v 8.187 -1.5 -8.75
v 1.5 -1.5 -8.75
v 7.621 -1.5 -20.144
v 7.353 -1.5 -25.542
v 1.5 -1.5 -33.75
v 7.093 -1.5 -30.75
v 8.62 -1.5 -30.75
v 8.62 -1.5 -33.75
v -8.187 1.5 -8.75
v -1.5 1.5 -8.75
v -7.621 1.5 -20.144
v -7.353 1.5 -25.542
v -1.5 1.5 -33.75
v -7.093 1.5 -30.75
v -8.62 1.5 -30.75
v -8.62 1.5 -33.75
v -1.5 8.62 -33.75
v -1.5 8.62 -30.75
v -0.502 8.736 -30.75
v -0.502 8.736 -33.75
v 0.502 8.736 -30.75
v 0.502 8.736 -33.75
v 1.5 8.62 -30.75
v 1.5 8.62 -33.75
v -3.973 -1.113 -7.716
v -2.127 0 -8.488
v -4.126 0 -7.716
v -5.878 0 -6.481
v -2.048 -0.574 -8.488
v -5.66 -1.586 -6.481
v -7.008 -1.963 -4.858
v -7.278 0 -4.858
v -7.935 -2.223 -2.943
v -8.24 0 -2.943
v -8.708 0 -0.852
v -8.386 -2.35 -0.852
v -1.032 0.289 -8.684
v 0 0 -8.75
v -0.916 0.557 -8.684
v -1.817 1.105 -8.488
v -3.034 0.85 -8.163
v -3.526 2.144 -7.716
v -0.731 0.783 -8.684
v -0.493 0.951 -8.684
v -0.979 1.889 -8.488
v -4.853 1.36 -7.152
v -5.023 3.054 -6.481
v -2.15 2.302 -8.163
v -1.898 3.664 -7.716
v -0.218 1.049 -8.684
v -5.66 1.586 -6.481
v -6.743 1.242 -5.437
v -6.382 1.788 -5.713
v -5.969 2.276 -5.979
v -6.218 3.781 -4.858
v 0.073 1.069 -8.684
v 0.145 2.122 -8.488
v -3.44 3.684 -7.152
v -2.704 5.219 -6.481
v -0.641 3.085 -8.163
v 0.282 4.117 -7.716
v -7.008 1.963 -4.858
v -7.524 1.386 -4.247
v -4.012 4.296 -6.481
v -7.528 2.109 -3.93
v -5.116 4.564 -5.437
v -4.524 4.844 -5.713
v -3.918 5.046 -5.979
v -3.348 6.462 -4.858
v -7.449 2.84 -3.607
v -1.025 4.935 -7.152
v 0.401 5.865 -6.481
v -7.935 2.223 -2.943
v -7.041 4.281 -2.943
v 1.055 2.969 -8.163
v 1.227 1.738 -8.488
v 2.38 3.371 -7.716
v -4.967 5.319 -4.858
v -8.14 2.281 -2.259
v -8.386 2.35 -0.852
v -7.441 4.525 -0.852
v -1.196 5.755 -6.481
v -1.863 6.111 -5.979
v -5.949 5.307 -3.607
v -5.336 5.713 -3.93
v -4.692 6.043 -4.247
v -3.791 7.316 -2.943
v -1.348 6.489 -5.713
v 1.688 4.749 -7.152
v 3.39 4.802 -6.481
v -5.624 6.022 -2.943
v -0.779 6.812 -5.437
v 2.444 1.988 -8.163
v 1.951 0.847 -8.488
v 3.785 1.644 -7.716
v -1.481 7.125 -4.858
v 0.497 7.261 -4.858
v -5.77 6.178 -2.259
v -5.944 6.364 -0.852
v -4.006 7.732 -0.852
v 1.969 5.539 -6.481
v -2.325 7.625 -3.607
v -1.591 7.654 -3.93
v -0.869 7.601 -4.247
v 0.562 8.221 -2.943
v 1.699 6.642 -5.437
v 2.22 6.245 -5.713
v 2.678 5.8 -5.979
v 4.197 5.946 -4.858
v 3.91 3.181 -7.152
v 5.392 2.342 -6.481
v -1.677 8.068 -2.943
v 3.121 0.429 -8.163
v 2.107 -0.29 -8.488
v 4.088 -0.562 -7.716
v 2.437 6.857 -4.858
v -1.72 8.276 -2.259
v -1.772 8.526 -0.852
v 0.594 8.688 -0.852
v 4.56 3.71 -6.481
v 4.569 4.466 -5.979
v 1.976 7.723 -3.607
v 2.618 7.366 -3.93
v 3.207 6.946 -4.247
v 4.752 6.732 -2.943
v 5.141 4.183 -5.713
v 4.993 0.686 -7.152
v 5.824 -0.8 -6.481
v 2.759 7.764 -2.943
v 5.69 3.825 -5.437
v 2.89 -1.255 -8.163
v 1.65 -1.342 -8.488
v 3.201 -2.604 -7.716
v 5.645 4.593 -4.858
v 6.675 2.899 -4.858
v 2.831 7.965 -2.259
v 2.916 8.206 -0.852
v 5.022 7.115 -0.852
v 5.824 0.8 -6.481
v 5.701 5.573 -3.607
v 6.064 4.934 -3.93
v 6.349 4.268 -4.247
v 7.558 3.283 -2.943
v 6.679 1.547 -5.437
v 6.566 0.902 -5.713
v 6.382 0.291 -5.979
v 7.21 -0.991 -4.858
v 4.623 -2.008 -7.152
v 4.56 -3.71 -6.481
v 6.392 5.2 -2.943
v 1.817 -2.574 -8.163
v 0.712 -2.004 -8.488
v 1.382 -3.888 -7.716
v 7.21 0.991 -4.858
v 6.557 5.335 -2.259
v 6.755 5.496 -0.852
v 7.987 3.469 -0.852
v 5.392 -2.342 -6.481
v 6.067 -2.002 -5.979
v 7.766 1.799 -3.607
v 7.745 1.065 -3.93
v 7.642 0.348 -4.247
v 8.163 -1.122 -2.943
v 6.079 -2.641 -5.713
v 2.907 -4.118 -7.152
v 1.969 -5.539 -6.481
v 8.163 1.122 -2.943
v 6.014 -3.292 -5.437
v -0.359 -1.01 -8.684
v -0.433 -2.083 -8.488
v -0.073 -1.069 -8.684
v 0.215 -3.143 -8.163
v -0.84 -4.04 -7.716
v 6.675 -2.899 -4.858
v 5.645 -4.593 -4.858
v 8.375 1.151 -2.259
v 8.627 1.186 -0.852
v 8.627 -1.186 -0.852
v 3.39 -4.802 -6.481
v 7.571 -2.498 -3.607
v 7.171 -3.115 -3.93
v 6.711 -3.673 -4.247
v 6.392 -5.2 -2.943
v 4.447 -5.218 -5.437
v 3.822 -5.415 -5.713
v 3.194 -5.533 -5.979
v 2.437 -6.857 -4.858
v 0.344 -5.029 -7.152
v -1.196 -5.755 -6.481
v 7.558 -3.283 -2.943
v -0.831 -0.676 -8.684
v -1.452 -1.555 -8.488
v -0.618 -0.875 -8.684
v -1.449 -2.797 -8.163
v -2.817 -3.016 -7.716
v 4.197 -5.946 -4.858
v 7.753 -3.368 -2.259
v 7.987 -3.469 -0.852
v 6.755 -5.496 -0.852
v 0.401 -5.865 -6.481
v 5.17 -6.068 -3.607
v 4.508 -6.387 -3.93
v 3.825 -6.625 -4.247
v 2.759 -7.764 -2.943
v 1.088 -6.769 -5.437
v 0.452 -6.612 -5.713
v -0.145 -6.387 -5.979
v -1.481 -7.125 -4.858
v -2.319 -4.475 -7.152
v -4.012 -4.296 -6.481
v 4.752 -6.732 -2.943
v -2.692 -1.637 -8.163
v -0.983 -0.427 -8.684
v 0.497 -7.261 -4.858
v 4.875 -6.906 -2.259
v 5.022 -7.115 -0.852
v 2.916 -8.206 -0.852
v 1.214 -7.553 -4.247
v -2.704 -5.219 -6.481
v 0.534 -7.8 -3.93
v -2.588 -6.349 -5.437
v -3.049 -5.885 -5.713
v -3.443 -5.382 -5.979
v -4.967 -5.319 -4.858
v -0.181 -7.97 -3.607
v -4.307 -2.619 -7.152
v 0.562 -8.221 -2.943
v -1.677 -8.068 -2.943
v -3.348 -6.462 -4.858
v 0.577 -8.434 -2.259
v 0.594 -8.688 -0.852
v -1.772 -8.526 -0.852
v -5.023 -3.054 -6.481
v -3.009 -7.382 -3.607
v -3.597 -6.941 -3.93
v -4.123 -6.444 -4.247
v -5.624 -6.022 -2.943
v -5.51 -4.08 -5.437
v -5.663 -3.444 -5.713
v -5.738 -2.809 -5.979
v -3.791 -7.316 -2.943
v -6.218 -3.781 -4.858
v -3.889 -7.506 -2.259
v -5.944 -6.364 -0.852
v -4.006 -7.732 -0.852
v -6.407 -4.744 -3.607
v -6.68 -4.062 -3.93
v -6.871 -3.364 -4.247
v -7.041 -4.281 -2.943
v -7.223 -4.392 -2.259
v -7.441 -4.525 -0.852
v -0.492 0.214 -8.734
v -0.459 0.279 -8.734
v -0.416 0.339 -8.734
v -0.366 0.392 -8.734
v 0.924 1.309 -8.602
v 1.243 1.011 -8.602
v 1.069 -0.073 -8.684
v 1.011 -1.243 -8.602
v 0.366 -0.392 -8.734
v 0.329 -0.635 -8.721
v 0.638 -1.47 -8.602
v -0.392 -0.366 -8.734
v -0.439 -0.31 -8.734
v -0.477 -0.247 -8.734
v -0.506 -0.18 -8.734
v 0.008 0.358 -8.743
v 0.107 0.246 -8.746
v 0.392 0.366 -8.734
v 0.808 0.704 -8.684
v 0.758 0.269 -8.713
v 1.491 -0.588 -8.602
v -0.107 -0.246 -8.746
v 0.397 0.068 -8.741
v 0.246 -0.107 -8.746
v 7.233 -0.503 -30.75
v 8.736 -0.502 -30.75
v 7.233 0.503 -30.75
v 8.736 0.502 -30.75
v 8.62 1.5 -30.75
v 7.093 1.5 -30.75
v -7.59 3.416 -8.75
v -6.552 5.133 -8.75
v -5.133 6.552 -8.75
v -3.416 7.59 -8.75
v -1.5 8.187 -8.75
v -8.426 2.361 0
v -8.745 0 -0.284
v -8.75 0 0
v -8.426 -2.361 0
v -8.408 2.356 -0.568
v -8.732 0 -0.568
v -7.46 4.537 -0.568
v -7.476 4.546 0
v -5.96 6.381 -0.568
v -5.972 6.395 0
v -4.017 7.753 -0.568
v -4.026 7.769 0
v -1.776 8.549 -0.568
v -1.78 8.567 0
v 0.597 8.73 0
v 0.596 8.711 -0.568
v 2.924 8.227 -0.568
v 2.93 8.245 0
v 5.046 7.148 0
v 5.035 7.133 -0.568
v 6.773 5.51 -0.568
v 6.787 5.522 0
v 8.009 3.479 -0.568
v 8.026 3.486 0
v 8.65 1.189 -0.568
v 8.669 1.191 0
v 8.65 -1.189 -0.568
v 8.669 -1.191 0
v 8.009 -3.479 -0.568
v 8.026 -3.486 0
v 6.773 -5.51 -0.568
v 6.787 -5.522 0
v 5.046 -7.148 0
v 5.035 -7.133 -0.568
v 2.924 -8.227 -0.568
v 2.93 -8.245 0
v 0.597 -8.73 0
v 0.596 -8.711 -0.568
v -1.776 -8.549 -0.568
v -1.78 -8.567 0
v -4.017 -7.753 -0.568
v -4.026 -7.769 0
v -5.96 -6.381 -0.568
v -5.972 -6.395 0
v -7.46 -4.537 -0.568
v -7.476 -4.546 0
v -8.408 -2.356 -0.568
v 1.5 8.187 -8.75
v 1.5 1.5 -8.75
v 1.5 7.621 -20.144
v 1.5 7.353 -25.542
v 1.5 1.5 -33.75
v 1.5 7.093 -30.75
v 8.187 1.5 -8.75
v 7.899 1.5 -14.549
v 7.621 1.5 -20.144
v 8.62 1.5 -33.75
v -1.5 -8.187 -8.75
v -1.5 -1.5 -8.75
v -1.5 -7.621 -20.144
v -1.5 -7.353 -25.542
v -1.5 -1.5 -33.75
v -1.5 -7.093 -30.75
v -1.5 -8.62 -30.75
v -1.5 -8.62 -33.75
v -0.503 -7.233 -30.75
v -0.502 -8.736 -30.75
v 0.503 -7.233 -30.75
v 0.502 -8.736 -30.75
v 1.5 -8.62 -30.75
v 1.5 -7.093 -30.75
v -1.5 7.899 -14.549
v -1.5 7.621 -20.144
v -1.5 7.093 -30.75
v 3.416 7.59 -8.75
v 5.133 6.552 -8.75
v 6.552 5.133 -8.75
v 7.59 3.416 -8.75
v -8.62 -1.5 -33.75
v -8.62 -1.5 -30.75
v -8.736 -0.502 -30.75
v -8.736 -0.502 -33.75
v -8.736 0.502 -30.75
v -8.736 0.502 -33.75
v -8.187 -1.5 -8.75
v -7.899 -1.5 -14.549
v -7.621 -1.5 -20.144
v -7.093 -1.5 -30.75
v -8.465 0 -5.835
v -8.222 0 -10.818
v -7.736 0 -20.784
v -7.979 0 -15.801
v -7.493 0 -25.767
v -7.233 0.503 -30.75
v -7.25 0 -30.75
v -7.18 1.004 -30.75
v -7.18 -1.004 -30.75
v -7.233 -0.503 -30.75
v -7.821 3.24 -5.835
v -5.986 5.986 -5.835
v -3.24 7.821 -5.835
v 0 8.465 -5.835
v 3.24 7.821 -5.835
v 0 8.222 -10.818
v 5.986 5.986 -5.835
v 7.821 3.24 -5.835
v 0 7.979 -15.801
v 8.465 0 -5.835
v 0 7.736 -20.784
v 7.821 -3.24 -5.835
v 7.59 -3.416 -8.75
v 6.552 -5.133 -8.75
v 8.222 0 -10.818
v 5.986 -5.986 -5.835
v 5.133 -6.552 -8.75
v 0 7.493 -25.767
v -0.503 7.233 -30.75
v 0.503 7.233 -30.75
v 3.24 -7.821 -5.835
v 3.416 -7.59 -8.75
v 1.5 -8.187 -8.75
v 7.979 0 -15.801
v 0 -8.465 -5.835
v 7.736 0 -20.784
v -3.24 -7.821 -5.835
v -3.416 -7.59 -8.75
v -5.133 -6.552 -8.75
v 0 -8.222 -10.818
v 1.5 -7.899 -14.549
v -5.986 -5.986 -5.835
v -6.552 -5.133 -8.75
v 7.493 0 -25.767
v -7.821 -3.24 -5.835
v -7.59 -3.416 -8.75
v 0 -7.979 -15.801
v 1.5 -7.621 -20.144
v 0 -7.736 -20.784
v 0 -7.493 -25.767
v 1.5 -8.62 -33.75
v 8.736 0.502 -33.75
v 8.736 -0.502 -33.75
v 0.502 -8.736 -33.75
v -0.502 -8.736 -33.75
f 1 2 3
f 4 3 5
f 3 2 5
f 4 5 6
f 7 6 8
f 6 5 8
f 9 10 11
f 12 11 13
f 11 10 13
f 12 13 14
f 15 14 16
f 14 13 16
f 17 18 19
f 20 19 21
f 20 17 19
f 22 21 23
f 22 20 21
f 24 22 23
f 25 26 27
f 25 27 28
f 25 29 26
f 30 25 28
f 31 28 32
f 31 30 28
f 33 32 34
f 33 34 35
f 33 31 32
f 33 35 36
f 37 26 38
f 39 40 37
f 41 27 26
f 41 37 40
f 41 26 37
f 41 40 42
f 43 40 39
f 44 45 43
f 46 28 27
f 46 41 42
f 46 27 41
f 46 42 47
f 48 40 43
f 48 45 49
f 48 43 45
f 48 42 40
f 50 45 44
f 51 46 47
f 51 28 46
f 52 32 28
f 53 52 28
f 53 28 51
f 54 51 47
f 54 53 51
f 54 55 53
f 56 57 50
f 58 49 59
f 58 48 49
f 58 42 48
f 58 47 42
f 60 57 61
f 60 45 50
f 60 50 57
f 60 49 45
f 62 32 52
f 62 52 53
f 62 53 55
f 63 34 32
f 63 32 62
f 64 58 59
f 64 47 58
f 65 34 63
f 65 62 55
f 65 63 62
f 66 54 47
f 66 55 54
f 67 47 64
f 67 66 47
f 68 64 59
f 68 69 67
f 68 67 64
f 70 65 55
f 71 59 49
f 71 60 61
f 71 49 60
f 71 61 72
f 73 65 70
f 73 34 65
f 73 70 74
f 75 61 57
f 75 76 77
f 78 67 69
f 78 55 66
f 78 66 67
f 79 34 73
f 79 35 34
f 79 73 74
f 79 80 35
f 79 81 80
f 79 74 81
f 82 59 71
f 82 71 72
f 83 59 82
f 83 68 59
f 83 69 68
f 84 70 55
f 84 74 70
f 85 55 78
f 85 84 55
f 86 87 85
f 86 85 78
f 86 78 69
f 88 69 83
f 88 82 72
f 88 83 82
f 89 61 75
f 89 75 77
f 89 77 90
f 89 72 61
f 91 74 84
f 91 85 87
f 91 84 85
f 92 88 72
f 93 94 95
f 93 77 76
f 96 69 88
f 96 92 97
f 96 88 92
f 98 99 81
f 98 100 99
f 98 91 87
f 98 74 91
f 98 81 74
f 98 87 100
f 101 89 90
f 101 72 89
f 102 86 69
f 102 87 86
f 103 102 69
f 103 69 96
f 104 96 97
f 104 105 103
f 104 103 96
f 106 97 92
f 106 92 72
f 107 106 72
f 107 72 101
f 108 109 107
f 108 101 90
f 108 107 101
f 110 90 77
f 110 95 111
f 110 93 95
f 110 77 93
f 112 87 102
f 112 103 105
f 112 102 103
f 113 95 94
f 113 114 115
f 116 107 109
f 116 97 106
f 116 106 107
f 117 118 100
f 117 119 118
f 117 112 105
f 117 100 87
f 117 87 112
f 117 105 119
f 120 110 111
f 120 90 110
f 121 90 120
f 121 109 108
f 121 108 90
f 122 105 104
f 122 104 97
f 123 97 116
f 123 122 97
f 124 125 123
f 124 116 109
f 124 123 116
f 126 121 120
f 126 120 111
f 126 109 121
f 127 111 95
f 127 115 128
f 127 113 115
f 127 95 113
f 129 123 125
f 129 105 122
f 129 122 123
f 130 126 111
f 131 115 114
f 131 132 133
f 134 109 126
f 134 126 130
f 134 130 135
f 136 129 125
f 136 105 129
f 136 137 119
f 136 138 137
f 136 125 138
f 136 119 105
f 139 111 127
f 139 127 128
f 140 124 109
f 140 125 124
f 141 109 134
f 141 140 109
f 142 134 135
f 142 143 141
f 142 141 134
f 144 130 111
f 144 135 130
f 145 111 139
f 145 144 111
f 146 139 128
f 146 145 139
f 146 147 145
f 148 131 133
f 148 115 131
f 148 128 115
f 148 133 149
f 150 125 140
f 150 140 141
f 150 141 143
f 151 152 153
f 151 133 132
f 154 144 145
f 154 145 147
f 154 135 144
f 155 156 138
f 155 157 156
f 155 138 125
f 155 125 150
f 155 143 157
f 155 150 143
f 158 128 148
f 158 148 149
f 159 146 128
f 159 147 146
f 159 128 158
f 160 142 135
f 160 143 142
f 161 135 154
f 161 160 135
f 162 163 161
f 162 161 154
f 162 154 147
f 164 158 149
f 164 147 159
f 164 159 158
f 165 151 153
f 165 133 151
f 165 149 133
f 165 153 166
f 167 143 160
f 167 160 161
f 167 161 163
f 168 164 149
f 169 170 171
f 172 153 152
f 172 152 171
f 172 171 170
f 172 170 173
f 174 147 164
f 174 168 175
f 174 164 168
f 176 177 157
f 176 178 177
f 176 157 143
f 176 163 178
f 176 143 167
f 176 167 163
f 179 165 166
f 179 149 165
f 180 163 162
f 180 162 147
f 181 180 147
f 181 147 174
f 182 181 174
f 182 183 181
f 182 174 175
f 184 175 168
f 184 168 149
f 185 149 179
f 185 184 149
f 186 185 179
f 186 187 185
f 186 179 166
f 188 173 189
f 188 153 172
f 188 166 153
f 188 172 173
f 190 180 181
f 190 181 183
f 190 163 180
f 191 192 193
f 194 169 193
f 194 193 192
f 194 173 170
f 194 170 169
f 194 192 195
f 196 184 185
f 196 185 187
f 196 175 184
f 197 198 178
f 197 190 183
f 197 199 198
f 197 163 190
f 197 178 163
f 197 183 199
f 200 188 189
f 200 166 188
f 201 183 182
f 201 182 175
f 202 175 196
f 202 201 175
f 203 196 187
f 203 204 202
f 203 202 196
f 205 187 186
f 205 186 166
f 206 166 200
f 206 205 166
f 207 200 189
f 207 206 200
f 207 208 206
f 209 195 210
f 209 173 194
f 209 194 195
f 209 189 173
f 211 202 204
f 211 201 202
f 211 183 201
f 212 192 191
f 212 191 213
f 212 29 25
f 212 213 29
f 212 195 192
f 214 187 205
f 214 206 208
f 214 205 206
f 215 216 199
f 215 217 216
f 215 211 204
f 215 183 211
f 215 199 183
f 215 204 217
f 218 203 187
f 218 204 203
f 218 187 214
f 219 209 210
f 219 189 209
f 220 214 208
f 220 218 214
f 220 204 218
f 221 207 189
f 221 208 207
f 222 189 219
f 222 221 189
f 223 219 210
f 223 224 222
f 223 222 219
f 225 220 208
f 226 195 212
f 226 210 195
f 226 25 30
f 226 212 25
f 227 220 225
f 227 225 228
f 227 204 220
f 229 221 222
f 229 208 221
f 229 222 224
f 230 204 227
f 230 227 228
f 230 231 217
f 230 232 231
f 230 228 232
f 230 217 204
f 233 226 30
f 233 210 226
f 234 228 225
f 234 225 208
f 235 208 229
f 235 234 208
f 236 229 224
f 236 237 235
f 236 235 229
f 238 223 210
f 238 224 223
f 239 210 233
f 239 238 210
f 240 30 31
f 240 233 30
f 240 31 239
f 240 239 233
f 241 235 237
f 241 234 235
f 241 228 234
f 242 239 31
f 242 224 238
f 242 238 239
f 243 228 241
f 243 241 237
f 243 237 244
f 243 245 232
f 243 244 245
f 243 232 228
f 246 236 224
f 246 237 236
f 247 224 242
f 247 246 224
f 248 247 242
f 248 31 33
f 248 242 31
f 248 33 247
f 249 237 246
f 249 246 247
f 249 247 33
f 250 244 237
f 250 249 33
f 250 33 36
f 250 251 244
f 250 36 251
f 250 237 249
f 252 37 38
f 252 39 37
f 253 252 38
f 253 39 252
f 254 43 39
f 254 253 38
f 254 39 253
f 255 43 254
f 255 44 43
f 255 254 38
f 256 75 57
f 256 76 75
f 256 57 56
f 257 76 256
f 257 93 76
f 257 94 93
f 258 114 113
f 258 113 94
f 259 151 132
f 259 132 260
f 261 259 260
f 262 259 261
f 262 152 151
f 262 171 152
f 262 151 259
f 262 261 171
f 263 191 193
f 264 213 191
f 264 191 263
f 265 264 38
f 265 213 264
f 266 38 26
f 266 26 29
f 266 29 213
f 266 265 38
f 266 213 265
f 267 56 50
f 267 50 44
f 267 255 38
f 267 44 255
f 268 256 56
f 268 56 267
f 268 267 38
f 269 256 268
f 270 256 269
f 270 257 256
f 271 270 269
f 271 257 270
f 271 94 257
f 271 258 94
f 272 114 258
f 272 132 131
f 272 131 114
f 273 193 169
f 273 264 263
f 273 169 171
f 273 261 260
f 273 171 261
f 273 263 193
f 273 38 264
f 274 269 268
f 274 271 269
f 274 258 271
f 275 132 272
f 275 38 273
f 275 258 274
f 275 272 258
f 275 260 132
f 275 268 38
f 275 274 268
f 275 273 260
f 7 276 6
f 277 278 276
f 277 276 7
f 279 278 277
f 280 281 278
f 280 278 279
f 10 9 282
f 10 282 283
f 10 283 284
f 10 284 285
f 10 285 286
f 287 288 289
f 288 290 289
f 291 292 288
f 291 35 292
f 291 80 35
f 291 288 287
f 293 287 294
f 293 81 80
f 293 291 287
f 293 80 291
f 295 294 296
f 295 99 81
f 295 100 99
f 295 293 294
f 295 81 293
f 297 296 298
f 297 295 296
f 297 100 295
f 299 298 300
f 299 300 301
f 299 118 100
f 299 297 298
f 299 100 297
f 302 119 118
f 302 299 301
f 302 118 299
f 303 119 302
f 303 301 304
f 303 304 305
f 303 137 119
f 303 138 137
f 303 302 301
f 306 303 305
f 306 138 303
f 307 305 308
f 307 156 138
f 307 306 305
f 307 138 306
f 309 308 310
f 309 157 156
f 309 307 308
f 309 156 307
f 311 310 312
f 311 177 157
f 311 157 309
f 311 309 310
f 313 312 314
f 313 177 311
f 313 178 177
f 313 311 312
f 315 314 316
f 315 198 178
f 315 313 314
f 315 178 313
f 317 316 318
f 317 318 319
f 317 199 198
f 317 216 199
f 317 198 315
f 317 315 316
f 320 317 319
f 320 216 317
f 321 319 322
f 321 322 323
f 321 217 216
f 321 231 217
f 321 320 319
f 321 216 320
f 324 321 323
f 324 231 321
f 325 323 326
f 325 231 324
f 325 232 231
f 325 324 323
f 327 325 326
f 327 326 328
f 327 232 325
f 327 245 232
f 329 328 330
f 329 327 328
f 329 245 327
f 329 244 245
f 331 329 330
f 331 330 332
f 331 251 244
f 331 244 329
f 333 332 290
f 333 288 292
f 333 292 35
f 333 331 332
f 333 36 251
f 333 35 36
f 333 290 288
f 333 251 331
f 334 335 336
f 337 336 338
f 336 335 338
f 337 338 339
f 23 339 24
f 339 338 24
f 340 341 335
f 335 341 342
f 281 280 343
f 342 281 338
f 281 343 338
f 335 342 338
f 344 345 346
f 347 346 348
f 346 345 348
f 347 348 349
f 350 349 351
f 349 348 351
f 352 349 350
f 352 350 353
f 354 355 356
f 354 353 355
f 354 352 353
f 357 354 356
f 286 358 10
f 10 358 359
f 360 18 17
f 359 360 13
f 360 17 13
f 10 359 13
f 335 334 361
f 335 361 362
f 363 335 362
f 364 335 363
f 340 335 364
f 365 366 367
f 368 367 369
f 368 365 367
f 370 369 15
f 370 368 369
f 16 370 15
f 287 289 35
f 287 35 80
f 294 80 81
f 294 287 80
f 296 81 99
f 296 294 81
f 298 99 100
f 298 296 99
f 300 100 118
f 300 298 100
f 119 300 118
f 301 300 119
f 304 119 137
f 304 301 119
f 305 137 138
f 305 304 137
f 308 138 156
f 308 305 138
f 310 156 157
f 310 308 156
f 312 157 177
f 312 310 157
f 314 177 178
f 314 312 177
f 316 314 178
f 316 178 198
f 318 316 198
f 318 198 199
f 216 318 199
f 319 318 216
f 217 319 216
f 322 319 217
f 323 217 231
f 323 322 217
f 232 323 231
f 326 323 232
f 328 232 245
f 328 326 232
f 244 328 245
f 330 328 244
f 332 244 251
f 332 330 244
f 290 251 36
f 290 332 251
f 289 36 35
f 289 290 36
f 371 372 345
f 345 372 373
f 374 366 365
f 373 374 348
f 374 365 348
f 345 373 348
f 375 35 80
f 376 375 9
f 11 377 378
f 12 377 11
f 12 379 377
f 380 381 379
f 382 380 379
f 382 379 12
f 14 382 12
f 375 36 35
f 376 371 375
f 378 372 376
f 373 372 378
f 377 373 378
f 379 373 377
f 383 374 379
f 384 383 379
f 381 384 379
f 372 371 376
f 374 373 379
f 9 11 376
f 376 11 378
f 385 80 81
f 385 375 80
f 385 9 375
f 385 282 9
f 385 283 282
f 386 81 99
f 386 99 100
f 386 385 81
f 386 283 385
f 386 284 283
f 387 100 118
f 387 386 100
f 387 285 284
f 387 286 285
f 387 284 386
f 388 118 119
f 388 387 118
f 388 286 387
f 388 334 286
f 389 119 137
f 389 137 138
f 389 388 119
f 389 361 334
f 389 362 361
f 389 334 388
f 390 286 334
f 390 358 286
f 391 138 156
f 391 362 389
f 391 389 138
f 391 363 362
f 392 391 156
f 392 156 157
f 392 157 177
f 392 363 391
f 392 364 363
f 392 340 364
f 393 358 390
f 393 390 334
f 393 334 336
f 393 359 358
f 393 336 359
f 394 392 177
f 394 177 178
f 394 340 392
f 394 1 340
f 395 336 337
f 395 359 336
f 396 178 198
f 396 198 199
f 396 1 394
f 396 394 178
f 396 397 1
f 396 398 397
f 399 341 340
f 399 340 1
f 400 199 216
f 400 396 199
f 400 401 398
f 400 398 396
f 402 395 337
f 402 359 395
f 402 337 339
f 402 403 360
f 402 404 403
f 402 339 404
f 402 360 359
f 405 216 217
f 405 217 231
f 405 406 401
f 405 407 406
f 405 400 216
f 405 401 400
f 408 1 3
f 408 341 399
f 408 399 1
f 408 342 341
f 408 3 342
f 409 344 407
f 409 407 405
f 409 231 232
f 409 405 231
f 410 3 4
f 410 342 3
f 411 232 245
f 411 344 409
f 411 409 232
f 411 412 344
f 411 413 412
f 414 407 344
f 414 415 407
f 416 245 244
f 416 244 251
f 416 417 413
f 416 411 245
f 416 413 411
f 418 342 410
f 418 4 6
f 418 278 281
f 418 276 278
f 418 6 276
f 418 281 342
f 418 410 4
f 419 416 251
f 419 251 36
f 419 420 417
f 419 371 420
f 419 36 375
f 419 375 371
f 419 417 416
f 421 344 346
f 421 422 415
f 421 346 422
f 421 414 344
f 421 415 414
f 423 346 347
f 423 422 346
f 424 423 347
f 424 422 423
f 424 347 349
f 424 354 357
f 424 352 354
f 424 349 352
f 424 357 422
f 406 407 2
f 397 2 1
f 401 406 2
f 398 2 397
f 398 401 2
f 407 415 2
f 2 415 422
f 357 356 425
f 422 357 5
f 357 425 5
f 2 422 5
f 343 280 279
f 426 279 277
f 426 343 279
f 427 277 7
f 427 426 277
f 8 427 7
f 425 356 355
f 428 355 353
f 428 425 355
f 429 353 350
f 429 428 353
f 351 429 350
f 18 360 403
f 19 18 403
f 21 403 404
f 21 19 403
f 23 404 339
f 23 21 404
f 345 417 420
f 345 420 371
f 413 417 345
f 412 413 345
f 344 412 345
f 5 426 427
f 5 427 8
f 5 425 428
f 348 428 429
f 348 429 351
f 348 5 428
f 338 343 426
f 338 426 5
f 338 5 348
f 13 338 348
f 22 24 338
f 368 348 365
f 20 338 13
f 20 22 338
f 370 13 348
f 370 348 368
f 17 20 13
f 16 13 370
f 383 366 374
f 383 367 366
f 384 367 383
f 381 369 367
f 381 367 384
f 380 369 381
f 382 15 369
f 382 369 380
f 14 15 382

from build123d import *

# Parameters (mm, degrees)
F3_DEPTH = 25


with BuildPart() as f1:
    # F0 (on Front) → F1 (revolve)
    with BuildSketch(Plane.XZ):
        with BuildLine():
            Line((-8.708457, -0.851632), (-8.75, 0))
            ThreePointArc((-8.75, 0), (-8.739608, -0.426322), (-8.708457, -0.851632))
        make_face()
        with BuildLine():
            ThreePointArc((0, -8.75), (-5.878381, -6.481292), (-8.708457, -0.851632))
            Line((-8.708457, -0.851632), (-7.25, -30.75))
            Line((-7.25, -30.75), (0, -30.75))
            Line((0, -30.75), (0, -8.75))
        make_face()
        Polygon((0, -30.75), (-7.25, -30.75), (-8.75, -30.75), (-8.75, -33.75), (0, -33.75), align=None)
    revolve(axis=Axis((0, 0, -16.875), (0, 0, -1)))

    # F2 (on face) → F3 (cut)
    with BuildSketch(Plane(origin=(0, 0, -33.75), x_dir=(1, 0, 0), z_dir=(0, 0, -1))):
        with BuildLine():
            ThreePointArc((-1.5, 8.62047), (-6.283299, 6.283299), (-8.62047, 1.5))
            Line((-8.62047, 1.5), (-1.5, 1.5))
            Line((-1.5, 1.5), (-1.5, 8.62047))
        make_face()
        with BuildLine():
            Line((1.5, 1.5), (8.62047, 1.5))
            ThreePointArc((8.62047, 1.5), (6.25421, 6.25421), (1.5, 8.62047))
            Line((1.5, 8.62047), (1.5, 1.5))
        make_face()
        with BuildLine():
            ThreePointArc((1.5, -8.62047), (6.283299, -6.283299), (8.62047, -1.5))
            Line((8.62047, -1.5), (1.5, -1.5))
            Line((1.5, -1.5), (1.5, -8.62047))
        make_face()
        with BuildLine():
            Line((-1.5, -1.5), (-8.62047, -1.5))
            ThreePointArc((-8.62047, -1.5), (-6.243431, -6.243431), (-1.5, -8.62047))
            Line((-1.5, -8.62047), (-1.5, -1.5))
        make_face()
    extrude(amount=-F3_DEPTH, mode=Mode.SUBTRACT)


solid = f1.part
